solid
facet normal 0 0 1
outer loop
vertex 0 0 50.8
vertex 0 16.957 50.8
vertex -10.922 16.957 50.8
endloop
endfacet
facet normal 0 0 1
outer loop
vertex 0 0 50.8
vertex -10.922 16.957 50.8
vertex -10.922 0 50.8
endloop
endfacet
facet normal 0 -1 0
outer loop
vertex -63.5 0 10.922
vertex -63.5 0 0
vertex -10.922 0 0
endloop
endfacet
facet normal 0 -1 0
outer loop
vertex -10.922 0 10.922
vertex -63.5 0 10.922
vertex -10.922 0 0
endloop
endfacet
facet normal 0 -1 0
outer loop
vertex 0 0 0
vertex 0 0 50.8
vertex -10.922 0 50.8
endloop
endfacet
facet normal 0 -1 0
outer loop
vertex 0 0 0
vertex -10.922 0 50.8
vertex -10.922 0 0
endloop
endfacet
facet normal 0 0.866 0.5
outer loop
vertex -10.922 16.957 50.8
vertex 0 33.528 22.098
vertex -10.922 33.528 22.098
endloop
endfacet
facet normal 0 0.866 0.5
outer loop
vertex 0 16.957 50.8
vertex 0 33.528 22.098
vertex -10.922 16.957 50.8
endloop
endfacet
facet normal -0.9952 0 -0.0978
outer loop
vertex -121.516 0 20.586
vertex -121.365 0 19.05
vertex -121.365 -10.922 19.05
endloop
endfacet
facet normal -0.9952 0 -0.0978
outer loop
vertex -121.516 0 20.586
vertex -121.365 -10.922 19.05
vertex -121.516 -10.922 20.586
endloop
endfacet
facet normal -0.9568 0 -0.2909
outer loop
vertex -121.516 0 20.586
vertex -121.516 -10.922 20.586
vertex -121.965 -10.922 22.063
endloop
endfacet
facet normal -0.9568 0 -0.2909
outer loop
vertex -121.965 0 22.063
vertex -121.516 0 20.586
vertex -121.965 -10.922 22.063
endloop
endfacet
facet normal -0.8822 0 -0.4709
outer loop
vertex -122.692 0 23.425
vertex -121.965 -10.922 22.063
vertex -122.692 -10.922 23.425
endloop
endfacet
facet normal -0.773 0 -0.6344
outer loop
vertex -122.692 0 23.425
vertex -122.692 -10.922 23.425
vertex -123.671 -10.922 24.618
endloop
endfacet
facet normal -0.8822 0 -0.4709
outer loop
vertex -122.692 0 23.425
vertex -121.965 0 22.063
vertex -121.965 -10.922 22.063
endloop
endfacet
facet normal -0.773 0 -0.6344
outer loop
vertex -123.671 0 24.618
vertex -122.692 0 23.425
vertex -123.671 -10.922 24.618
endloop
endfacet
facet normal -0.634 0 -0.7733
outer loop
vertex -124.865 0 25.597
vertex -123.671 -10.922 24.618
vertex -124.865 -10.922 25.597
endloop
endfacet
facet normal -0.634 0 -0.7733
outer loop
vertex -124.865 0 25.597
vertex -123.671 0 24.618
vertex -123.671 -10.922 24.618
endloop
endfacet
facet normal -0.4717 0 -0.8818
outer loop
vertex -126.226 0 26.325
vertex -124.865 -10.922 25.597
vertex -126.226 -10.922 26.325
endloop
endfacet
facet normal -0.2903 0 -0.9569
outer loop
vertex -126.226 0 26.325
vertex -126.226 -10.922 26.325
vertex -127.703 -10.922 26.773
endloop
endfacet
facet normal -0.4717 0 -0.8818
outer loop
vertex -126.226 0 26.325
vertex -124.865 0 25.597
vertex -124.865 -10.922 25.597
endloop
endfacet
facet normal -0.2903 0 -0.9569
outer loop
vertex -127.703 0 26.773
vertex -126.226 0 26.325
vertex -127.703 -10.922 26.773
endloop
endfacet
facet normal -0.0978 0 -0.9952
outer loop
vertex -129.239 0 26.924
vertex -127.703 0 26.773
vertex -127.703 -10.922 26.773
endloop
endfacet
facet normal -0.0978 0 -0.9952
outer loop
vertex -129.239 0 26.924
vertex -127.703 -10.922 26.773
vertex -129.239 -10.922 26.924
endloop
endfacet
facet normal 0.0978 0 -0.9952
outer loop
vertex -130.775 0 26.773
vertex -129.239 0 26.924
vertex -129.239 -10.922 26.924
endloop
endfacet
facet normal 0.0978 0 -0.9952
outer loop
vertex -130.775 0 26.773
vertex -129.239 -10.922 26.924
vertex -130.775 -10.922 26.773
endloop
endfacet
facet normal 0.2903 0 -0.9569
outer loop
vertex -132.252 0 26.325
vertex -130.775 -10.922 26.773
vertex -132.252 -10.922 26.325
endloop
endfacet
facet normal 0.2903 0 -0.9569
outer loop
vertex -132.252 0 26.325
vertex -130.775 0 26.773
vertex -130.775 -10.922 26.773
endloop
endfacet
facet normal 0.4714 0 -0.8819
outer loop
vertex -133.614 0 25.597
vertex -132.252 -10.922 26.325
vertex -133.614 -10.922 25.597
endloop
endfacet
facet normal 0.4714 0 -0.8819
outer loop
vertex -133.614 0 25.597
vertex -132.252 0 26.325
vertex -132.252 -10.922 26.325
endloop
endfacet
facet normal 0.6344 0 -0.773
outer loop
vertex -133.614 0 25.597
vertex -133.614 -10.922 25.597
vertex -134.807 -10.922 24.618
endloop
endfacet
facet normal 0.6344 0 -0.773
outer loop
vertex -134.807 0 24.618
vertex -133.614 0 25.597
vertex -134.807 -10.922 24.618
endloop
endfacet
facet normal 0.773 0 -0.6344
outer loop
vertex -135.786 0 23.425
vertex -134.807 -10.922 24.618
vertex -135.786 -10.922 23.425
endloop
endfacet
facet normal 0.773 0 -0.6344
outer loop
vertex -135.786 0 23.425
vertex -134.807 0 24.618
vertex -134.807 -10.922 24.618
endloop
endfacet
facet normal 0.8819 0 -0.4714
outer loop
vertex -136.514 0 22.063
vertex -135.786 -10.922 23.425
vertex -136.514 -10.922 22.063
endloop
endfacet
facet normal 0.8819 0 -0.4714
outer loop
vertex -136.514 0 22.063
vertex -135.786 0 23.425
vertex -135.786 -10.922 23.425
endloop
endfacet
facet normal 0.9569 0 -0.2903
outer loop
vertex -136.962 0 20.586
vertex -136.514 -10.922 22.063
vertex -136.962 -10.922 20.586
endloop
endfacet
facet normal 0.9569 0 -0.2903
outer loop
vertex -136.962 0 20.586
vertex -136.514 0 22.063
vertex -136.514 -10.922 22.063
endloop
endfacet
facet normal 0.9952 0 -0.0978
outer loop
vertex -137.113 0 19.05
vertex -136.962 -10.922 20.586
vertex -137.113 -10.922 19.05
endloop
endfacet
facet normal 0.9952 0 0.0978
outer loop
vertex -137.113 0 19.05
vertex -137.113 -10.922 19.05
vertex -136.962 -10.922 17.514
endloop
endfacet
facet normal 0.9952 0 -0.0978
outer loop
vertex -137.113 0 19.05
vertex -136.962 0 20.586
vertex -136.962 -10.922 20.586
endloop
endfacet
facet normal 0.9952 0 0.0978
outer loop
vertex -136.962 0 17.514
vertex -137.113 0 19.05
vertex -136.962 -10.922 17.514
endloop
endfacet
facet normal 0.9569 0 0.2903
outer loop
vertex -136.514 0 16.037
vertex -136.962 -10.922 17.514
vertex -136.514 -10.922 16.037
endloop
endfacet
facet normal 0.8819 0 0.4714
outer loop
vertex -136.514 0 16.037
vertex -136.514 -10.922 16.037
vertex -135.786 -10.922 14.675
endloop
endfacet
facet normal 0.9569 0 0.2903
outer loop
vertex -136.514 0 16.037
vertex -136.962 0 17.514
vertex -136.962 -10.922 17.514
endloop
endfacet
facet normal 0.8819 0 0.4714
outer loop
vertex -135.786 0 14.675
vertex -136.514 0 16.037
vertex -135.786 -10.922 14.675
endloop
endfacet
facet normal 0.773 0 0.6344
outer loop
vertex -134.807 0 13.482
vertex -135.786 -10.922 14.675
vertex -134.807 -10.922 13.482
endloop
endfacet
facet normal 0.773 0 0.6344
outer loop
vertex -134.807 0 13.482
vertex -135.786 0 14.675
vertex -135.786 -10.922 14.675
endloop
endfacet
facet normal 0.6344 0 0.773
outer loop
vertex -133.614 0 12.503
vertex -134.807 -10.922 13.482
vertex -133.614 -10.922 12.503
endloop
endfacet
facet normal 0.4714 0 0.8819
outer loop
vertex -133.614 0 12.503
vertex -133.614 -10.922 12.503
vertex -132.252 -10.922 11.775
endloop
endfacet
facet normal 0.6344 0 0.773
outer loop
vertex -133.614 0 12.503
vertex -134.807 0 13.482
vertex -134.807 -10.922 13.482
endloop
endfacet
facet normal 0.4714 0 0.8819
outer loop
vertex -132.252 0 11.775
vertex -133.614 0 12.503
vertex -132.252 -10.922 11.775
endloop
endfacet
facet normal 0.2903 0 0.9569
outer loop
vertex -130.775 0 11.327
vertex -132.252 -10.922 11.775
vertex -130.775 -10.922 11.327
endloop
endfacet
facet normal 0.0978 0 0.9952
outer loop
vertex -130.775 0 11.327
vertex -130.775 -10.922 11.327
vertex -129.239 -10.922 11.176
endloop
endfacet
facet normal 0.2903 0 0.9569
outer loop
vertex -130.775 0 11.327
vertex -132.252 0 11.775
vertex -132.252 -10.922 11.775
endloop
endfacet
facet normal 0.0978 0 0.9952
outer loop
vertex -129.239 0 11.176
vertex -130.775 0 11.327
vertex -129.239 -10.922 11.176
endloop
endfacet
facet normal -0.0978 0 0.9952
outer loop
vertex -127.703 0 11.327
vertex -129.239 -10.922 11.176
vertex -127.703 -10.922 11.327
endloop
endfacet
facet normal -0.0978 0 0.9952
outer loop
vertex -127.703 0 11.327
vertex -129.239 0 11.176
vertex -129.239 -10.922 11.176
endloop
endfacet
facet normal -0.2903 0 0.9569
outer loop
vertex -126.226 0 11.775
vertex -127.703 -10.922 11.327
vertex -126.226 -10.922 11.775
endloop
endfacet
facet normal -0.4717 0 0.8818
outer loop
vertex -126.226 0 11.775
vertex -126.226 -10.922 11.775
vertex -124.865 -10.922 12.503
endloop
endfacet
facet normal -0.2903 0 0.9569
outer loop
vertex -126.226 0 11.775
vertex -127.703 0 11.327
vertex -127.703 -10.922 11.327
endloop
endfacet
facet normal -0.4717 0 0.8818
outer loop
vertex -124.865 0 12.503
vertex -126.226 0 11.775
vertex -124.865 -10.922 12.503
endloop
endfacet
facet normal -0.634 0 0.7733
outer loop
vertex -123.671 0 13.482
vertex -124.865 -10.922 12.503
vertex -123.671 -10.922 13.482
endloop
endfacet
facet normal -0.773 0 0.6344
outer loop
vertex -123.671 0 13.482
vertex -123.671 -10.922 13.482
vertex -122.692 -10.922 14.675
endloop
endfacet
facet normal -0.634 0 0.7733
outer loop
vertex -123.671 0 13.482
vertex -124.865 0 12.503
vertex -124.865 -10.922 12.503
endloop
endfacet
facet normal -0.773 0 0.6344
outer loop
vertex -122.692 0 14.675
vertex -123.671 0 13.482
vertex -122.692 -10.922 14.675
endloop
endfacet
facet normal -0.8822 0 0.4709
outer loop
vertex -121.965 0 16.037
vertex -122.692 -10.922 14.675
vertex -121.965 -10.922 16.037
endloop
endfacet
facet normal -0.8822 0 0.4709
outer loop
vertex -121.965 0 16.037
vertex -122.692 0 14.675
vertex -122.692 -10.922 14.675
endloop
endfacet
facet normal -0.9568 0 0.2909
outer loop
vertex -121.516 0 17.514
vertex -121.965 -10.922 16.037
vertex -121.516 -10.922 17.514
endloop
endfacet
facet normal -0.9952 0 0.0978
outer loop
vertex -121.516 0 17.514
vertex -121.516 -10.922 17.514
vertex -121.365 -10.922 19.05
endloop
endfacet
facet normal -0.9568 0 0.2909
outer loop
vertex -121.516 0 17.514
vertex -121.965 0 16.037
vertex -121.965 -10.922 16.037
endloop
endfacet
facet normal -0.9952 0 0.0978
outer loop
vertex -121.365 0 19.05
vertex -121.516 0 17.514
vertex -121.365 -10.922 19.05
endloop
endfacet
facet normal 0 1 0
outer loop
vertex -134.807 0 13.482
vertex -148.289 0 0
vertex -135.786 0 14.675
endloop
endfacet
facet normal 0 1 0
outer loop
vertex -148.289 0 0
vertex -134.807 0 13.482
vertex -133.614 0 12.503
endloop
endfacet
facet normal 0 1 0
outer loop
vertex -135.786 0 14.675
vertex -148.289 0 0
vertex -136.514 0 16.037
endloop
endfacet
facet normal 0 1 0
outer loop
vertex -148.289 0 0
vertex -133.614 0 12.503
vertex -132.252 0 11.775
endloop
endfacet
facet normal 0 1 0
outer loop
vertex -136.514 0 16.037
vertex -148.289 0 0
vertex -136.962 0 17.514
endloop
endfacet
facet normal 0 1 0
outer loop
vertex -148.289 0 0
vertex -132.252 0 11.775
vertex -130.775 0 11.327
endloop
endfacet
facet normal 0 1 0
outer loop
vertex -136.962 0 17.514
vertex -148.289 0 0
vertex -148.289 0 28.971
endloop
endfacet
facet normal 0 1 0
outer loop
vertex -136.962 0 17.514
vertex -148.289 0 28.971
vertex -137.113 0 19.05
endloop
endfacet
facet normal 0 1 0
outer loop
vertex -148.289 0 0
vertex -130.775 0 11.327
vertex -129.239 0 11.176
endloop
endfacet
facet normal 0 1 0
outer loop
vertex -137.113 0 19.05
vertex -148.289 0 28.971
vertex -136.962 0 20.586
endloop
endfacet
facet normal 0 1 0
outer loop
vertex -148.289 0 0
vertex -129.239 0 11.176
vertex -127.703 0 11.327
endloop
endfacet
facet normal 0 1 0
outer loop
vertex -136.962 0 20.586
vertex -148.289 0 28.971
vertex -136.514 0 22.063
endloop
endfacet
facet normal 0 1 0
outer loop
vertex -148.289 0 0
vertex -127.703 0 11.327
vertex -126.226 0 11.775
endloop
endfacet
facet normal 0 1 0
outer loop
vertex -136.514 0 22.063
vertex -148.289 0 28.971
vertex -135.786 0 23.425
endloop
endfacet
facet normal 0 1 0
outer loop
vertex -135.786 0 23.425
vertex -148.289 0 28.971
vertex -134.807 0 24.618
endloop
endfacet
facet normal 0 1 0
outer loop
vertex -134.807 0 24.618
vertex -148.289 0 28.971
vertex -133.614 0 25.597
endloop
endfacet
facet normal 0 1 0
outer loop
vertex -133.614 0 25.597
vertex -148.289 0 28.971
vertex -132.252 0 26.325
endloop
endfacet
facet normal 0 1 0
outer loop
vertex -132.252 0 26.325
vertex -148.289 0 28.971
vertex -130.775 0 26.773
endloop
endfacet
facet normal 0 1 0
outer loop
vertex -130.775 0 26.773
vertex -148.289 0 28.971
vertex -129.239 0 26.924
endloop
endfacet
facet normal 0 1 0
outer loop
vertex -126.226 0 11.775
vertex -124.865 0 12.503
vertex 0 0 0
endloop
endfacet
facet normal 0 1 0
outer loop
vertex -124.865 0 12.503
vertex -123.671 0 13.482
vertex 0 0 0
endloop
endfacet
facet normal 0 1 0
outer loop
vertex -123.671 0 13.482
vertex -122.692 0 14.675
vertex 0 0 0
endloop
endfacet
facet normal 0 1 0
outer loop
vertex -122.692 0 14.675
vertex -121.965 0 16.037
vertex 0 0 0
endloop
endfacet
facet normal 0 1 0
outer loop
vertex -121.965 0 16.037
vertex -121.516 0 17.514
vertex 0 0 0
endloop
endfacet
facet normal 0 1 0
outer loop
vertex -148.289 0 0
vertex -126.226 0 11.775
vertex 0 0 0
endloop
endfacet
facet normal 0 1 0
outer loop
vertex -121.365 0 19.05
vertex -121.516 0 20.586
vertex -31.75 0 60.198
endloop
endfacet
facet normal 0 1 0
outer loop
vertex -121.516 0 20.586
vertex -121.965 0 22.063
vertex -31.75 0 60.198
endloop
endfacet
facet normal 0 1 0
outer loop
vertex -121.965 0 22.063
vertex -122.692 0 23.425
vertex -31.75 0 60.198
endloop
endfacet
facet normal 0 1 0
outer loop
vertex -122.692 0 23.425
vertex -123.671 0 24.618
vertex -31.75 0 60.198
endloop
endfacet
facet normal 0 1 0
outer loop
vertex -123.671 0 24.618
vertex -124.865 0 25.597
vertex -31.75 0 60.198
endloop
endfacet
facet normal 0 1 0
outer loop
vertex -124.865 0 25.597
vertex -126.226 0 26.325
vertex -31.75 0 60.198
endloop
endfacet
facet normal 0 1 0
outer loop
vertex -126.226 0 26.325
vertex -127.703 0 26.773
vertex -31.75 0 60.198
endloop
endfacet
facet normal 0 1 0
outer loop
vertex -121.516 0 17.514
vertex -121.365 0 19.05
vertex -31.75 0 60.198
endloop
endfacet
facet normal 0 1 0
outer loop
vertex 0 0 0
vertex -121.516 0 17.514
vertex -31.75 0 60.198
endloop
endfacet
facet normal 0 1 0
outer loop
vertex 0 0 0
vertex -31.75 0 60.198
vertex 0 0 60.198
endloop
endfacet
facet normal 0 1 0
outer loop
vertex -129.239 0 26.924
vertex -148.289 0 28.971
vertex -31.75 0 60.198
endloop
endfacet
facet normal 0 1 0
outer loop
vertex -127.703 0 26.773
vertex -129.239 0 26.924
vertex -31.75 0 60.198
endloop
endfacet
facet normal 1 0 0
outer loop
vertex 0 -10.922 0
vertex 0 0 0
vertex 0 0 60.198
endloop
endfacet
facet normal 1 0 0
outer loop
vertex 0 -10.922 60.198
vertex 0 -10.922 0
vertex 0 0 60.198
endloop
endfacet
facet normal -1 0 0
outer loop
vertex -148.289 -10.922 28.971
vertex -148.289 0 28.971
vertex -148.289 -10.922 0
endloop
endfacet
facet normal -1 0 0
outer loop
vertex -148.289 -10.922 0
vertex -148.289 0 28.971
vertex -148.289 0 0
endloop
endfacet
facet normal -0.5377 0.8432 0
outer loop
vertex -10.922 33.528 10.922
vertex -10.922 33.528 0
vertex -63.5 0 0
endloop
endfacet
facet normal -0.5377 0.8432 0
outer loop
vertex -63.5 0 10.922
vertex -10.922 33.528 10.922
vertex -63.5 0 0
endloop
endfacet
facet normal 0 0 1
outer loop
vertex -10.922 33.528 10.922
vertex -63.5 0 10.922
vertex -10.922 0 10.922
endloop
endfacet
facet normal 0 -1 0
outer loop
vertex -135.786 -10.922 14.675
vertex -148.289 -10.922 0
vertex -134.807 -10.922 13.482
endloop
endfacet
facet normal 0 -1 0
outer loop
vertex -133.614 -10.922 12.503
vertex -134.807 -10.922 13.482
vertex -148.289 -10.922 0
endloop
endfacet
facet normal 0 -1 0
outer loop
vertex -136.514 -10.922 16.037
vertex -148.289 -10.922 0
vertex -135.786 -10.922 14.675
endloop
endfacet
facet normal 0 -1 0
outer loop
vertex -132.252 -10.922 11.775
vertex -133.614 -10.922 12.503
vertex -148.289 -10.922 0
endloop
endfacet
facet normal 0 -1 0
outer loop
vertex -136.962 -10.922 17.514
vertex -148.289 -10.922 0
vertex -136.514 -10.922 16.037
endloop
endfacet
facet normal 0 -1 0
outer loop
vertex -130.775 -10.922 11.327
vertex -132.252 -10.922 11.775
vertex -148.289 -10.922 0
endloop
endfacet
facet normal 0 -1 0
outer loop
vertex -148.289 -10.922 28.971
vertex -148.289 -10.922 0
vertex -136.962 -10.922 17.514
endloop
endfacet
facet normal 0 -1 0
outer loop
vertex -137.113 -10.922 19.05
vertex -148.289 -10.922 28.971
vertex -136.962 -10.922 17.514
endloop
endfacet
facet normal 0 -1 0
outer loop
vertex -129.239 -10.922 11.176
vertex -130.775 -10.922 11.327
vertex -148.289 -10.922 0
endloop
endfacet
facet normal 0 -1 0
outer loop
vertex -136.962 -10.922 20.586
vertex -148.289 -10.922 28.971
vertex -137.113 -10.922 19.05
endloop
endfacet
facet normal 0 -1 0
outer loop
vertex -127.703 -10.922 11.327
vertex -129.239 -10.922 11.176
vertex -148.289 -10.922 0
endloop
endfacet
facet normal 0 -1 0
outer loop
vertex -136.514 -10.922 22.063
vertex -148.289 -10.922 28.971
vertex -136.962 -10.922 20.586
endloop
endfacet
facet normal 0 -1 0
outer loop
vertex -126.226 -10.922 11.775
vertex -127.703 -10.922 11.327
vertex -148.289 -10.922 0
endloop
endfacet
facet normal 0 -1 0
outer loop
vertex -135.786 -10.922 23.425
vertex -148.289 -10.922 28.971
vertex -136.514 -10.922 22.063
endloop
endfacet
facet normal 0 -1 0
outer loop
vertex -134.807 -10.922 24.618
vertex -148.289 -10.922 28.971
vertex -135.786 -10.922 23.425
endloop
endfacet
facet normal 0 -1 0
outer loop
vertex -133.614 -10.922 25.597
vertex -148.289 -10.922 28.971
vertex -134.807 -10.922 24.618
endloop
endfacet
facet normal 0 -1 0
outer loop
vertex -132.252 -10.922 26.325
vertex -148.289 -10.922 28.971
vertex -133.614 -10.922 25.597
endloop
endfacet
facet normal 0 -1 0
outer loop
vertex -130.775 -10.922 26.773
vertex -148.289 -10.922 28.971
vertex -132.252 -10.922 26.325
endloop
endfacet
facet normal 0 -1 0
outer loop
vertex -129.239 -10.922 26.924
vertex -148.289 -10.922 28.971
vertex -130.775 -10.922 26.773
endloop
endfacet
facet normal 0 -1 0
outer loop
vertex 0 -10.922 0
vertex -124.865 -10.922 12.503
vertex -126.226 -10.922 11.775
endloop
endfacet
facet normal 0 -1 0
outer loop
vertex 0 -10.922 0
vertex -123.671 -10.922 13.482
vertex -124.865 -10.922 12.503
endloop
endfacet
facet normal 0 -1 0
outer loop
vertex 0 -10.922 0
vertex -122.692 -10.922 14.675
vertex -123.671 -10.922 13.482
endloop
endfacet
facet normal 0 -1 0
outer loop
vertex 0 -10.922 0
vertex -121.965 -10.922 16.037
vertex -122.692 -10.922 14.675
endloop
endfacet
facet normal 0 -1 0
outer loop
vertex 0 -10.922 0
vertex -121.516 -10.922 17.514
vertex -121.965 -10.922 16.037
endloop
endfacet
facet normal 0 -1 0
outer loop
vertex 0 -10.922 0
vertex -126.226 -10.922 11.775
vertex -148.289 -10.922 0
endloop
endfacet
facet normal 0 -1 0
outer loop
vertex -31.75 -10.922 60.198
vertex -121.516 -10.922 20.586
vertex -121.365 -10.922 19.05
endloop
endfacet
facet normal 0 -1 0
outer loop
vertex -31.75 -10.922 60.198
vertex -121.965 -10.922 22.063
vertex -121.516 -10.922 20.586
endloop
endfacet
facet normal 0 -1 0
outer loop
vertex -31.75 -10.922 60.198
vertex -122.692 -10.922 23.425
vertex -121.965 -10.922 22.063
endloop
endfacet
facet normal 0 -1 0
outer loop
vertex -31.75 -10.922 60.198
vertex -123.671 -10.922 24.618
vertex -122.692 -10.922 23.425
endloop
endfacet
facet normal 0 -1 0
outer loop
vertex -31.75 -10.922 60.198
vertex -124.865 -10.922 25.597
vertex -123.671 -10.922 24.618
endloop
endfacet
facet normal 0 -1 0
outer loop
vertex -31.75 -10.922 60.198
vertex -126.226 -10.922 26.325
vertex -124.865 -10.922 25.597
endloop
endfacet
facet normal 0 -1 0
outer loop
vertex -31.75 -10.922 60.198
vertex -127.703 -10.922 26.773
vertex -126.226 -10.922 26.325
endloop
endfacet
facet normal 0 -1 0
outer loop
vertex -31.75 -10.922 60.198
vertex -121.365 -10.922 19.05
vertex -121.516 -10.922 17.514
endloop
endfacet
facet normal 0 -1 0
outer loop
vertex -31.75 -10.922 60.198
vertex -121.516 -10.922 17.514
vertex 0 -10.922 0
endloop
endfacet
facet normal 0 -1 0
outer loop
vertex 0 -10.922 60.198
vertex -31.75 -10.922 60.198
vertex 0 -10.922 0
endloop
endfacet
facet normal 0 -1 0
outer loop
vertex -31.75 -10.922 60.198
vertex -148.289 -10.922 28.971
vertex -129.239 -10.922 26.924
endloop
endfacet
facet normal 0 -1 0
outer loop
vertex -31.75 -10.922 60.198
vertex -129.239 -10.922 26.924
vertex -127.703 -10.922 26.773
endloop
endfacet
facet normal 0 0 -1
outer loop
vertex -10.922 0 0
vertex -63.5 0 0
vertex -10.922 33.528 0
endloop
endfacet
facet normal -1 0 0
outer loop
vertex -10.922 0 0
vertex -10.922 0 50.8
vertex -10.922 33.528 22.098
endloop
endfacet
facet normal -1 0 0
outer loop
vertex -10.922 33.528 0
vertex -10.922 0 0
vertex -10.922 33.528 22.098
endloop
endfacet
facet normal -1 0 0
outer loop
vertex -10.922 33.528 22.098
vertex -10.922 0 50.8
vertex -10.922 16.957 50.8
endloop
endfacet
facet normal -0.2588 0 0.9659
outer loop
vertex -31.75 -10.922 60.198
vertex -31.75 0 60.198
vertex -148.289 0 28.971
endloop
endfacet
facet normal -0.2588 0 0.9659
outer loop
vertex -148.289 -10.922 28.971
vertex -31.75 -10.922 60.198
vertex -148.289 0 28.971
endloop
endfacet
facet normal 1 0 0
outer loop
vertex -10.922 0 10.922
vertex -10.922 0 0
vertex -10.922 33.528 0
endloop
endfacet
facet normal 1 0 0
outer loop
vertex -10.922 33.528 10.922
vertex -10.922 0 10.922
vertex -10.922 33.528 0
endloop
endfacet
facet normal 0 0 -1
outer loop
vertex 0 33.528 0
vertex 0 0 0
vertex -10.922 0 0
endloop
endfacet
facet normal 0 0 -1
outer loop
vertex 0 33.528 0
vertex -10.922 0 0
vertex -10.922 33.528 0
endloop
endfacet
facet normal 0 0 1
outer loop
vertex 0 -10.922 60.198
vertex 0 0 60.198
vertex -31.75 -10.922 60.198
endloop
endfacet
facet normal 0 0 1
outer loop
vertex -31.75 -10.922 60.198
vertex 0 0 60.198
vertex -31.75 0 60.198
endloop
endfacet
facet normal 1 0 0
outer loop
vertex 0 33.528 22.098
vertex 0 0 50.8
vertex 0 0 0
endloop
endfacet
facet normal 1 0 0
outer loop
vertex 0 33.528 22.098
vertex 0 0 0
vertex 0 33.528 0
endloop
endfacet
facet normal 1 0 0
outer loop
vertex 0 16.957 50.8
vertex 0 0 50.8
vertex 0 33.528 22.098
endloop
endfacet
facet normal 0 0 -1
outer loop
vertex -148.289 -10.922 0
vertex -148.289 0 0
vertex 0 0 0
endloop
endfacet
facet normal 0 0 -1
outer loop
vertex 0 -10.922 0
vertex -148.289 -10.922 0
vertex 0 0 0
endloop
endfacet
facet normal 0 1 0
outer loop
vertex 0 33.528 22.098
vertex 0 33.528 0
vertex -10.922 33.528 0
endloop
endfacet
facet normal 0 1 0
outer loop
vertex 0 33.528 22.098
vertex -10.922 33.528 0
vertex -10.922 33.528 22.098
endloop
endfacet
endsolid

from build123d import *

# Parameters (mm, degrees)
F0_R     = 7.874
F1_DEPTH = 10.922
F3_DEPTH = 10.922
F5_DEPTH = 10.922


with BuildPart() as f1:
    # F0 (on Front) → F1 (new body)
    with BuildSketch(Plane.XZ):
        Polygon((-148.289199, 0), (0, 0), (0, 60.198), (-31.75, 60.198), (-148.289199, 28.971416), align=None)
        with Locations((-129.239199, 19.05)):
            Circle(F0_R, mode=Mode.SUBTRACT)
    extrude(amount=F1_DEPTH)


with BuildPart() as f3:
    # F2 (on Right) → F3 (new body)
    with BuildSketch(Plane.YZ):
        Polygon((0, 50.8), (0, 0), (33.528, 0), (33.528, 22.098), (16.956893, 50.8), align=None)
    extrude(amount=-F3_DEPTH)


with BuildPart() as f5:
    # F4 (on Top) → F5 (new body)
    with BuildSketch(Plane.XY):
        Polygon((-63.5, 0), (-10.922, 0), (-10.922, 33.528), align=None)
    extrude(amount=F5_DEPTH)


solid = Compound([f1.part, f3.part, f5.part])
